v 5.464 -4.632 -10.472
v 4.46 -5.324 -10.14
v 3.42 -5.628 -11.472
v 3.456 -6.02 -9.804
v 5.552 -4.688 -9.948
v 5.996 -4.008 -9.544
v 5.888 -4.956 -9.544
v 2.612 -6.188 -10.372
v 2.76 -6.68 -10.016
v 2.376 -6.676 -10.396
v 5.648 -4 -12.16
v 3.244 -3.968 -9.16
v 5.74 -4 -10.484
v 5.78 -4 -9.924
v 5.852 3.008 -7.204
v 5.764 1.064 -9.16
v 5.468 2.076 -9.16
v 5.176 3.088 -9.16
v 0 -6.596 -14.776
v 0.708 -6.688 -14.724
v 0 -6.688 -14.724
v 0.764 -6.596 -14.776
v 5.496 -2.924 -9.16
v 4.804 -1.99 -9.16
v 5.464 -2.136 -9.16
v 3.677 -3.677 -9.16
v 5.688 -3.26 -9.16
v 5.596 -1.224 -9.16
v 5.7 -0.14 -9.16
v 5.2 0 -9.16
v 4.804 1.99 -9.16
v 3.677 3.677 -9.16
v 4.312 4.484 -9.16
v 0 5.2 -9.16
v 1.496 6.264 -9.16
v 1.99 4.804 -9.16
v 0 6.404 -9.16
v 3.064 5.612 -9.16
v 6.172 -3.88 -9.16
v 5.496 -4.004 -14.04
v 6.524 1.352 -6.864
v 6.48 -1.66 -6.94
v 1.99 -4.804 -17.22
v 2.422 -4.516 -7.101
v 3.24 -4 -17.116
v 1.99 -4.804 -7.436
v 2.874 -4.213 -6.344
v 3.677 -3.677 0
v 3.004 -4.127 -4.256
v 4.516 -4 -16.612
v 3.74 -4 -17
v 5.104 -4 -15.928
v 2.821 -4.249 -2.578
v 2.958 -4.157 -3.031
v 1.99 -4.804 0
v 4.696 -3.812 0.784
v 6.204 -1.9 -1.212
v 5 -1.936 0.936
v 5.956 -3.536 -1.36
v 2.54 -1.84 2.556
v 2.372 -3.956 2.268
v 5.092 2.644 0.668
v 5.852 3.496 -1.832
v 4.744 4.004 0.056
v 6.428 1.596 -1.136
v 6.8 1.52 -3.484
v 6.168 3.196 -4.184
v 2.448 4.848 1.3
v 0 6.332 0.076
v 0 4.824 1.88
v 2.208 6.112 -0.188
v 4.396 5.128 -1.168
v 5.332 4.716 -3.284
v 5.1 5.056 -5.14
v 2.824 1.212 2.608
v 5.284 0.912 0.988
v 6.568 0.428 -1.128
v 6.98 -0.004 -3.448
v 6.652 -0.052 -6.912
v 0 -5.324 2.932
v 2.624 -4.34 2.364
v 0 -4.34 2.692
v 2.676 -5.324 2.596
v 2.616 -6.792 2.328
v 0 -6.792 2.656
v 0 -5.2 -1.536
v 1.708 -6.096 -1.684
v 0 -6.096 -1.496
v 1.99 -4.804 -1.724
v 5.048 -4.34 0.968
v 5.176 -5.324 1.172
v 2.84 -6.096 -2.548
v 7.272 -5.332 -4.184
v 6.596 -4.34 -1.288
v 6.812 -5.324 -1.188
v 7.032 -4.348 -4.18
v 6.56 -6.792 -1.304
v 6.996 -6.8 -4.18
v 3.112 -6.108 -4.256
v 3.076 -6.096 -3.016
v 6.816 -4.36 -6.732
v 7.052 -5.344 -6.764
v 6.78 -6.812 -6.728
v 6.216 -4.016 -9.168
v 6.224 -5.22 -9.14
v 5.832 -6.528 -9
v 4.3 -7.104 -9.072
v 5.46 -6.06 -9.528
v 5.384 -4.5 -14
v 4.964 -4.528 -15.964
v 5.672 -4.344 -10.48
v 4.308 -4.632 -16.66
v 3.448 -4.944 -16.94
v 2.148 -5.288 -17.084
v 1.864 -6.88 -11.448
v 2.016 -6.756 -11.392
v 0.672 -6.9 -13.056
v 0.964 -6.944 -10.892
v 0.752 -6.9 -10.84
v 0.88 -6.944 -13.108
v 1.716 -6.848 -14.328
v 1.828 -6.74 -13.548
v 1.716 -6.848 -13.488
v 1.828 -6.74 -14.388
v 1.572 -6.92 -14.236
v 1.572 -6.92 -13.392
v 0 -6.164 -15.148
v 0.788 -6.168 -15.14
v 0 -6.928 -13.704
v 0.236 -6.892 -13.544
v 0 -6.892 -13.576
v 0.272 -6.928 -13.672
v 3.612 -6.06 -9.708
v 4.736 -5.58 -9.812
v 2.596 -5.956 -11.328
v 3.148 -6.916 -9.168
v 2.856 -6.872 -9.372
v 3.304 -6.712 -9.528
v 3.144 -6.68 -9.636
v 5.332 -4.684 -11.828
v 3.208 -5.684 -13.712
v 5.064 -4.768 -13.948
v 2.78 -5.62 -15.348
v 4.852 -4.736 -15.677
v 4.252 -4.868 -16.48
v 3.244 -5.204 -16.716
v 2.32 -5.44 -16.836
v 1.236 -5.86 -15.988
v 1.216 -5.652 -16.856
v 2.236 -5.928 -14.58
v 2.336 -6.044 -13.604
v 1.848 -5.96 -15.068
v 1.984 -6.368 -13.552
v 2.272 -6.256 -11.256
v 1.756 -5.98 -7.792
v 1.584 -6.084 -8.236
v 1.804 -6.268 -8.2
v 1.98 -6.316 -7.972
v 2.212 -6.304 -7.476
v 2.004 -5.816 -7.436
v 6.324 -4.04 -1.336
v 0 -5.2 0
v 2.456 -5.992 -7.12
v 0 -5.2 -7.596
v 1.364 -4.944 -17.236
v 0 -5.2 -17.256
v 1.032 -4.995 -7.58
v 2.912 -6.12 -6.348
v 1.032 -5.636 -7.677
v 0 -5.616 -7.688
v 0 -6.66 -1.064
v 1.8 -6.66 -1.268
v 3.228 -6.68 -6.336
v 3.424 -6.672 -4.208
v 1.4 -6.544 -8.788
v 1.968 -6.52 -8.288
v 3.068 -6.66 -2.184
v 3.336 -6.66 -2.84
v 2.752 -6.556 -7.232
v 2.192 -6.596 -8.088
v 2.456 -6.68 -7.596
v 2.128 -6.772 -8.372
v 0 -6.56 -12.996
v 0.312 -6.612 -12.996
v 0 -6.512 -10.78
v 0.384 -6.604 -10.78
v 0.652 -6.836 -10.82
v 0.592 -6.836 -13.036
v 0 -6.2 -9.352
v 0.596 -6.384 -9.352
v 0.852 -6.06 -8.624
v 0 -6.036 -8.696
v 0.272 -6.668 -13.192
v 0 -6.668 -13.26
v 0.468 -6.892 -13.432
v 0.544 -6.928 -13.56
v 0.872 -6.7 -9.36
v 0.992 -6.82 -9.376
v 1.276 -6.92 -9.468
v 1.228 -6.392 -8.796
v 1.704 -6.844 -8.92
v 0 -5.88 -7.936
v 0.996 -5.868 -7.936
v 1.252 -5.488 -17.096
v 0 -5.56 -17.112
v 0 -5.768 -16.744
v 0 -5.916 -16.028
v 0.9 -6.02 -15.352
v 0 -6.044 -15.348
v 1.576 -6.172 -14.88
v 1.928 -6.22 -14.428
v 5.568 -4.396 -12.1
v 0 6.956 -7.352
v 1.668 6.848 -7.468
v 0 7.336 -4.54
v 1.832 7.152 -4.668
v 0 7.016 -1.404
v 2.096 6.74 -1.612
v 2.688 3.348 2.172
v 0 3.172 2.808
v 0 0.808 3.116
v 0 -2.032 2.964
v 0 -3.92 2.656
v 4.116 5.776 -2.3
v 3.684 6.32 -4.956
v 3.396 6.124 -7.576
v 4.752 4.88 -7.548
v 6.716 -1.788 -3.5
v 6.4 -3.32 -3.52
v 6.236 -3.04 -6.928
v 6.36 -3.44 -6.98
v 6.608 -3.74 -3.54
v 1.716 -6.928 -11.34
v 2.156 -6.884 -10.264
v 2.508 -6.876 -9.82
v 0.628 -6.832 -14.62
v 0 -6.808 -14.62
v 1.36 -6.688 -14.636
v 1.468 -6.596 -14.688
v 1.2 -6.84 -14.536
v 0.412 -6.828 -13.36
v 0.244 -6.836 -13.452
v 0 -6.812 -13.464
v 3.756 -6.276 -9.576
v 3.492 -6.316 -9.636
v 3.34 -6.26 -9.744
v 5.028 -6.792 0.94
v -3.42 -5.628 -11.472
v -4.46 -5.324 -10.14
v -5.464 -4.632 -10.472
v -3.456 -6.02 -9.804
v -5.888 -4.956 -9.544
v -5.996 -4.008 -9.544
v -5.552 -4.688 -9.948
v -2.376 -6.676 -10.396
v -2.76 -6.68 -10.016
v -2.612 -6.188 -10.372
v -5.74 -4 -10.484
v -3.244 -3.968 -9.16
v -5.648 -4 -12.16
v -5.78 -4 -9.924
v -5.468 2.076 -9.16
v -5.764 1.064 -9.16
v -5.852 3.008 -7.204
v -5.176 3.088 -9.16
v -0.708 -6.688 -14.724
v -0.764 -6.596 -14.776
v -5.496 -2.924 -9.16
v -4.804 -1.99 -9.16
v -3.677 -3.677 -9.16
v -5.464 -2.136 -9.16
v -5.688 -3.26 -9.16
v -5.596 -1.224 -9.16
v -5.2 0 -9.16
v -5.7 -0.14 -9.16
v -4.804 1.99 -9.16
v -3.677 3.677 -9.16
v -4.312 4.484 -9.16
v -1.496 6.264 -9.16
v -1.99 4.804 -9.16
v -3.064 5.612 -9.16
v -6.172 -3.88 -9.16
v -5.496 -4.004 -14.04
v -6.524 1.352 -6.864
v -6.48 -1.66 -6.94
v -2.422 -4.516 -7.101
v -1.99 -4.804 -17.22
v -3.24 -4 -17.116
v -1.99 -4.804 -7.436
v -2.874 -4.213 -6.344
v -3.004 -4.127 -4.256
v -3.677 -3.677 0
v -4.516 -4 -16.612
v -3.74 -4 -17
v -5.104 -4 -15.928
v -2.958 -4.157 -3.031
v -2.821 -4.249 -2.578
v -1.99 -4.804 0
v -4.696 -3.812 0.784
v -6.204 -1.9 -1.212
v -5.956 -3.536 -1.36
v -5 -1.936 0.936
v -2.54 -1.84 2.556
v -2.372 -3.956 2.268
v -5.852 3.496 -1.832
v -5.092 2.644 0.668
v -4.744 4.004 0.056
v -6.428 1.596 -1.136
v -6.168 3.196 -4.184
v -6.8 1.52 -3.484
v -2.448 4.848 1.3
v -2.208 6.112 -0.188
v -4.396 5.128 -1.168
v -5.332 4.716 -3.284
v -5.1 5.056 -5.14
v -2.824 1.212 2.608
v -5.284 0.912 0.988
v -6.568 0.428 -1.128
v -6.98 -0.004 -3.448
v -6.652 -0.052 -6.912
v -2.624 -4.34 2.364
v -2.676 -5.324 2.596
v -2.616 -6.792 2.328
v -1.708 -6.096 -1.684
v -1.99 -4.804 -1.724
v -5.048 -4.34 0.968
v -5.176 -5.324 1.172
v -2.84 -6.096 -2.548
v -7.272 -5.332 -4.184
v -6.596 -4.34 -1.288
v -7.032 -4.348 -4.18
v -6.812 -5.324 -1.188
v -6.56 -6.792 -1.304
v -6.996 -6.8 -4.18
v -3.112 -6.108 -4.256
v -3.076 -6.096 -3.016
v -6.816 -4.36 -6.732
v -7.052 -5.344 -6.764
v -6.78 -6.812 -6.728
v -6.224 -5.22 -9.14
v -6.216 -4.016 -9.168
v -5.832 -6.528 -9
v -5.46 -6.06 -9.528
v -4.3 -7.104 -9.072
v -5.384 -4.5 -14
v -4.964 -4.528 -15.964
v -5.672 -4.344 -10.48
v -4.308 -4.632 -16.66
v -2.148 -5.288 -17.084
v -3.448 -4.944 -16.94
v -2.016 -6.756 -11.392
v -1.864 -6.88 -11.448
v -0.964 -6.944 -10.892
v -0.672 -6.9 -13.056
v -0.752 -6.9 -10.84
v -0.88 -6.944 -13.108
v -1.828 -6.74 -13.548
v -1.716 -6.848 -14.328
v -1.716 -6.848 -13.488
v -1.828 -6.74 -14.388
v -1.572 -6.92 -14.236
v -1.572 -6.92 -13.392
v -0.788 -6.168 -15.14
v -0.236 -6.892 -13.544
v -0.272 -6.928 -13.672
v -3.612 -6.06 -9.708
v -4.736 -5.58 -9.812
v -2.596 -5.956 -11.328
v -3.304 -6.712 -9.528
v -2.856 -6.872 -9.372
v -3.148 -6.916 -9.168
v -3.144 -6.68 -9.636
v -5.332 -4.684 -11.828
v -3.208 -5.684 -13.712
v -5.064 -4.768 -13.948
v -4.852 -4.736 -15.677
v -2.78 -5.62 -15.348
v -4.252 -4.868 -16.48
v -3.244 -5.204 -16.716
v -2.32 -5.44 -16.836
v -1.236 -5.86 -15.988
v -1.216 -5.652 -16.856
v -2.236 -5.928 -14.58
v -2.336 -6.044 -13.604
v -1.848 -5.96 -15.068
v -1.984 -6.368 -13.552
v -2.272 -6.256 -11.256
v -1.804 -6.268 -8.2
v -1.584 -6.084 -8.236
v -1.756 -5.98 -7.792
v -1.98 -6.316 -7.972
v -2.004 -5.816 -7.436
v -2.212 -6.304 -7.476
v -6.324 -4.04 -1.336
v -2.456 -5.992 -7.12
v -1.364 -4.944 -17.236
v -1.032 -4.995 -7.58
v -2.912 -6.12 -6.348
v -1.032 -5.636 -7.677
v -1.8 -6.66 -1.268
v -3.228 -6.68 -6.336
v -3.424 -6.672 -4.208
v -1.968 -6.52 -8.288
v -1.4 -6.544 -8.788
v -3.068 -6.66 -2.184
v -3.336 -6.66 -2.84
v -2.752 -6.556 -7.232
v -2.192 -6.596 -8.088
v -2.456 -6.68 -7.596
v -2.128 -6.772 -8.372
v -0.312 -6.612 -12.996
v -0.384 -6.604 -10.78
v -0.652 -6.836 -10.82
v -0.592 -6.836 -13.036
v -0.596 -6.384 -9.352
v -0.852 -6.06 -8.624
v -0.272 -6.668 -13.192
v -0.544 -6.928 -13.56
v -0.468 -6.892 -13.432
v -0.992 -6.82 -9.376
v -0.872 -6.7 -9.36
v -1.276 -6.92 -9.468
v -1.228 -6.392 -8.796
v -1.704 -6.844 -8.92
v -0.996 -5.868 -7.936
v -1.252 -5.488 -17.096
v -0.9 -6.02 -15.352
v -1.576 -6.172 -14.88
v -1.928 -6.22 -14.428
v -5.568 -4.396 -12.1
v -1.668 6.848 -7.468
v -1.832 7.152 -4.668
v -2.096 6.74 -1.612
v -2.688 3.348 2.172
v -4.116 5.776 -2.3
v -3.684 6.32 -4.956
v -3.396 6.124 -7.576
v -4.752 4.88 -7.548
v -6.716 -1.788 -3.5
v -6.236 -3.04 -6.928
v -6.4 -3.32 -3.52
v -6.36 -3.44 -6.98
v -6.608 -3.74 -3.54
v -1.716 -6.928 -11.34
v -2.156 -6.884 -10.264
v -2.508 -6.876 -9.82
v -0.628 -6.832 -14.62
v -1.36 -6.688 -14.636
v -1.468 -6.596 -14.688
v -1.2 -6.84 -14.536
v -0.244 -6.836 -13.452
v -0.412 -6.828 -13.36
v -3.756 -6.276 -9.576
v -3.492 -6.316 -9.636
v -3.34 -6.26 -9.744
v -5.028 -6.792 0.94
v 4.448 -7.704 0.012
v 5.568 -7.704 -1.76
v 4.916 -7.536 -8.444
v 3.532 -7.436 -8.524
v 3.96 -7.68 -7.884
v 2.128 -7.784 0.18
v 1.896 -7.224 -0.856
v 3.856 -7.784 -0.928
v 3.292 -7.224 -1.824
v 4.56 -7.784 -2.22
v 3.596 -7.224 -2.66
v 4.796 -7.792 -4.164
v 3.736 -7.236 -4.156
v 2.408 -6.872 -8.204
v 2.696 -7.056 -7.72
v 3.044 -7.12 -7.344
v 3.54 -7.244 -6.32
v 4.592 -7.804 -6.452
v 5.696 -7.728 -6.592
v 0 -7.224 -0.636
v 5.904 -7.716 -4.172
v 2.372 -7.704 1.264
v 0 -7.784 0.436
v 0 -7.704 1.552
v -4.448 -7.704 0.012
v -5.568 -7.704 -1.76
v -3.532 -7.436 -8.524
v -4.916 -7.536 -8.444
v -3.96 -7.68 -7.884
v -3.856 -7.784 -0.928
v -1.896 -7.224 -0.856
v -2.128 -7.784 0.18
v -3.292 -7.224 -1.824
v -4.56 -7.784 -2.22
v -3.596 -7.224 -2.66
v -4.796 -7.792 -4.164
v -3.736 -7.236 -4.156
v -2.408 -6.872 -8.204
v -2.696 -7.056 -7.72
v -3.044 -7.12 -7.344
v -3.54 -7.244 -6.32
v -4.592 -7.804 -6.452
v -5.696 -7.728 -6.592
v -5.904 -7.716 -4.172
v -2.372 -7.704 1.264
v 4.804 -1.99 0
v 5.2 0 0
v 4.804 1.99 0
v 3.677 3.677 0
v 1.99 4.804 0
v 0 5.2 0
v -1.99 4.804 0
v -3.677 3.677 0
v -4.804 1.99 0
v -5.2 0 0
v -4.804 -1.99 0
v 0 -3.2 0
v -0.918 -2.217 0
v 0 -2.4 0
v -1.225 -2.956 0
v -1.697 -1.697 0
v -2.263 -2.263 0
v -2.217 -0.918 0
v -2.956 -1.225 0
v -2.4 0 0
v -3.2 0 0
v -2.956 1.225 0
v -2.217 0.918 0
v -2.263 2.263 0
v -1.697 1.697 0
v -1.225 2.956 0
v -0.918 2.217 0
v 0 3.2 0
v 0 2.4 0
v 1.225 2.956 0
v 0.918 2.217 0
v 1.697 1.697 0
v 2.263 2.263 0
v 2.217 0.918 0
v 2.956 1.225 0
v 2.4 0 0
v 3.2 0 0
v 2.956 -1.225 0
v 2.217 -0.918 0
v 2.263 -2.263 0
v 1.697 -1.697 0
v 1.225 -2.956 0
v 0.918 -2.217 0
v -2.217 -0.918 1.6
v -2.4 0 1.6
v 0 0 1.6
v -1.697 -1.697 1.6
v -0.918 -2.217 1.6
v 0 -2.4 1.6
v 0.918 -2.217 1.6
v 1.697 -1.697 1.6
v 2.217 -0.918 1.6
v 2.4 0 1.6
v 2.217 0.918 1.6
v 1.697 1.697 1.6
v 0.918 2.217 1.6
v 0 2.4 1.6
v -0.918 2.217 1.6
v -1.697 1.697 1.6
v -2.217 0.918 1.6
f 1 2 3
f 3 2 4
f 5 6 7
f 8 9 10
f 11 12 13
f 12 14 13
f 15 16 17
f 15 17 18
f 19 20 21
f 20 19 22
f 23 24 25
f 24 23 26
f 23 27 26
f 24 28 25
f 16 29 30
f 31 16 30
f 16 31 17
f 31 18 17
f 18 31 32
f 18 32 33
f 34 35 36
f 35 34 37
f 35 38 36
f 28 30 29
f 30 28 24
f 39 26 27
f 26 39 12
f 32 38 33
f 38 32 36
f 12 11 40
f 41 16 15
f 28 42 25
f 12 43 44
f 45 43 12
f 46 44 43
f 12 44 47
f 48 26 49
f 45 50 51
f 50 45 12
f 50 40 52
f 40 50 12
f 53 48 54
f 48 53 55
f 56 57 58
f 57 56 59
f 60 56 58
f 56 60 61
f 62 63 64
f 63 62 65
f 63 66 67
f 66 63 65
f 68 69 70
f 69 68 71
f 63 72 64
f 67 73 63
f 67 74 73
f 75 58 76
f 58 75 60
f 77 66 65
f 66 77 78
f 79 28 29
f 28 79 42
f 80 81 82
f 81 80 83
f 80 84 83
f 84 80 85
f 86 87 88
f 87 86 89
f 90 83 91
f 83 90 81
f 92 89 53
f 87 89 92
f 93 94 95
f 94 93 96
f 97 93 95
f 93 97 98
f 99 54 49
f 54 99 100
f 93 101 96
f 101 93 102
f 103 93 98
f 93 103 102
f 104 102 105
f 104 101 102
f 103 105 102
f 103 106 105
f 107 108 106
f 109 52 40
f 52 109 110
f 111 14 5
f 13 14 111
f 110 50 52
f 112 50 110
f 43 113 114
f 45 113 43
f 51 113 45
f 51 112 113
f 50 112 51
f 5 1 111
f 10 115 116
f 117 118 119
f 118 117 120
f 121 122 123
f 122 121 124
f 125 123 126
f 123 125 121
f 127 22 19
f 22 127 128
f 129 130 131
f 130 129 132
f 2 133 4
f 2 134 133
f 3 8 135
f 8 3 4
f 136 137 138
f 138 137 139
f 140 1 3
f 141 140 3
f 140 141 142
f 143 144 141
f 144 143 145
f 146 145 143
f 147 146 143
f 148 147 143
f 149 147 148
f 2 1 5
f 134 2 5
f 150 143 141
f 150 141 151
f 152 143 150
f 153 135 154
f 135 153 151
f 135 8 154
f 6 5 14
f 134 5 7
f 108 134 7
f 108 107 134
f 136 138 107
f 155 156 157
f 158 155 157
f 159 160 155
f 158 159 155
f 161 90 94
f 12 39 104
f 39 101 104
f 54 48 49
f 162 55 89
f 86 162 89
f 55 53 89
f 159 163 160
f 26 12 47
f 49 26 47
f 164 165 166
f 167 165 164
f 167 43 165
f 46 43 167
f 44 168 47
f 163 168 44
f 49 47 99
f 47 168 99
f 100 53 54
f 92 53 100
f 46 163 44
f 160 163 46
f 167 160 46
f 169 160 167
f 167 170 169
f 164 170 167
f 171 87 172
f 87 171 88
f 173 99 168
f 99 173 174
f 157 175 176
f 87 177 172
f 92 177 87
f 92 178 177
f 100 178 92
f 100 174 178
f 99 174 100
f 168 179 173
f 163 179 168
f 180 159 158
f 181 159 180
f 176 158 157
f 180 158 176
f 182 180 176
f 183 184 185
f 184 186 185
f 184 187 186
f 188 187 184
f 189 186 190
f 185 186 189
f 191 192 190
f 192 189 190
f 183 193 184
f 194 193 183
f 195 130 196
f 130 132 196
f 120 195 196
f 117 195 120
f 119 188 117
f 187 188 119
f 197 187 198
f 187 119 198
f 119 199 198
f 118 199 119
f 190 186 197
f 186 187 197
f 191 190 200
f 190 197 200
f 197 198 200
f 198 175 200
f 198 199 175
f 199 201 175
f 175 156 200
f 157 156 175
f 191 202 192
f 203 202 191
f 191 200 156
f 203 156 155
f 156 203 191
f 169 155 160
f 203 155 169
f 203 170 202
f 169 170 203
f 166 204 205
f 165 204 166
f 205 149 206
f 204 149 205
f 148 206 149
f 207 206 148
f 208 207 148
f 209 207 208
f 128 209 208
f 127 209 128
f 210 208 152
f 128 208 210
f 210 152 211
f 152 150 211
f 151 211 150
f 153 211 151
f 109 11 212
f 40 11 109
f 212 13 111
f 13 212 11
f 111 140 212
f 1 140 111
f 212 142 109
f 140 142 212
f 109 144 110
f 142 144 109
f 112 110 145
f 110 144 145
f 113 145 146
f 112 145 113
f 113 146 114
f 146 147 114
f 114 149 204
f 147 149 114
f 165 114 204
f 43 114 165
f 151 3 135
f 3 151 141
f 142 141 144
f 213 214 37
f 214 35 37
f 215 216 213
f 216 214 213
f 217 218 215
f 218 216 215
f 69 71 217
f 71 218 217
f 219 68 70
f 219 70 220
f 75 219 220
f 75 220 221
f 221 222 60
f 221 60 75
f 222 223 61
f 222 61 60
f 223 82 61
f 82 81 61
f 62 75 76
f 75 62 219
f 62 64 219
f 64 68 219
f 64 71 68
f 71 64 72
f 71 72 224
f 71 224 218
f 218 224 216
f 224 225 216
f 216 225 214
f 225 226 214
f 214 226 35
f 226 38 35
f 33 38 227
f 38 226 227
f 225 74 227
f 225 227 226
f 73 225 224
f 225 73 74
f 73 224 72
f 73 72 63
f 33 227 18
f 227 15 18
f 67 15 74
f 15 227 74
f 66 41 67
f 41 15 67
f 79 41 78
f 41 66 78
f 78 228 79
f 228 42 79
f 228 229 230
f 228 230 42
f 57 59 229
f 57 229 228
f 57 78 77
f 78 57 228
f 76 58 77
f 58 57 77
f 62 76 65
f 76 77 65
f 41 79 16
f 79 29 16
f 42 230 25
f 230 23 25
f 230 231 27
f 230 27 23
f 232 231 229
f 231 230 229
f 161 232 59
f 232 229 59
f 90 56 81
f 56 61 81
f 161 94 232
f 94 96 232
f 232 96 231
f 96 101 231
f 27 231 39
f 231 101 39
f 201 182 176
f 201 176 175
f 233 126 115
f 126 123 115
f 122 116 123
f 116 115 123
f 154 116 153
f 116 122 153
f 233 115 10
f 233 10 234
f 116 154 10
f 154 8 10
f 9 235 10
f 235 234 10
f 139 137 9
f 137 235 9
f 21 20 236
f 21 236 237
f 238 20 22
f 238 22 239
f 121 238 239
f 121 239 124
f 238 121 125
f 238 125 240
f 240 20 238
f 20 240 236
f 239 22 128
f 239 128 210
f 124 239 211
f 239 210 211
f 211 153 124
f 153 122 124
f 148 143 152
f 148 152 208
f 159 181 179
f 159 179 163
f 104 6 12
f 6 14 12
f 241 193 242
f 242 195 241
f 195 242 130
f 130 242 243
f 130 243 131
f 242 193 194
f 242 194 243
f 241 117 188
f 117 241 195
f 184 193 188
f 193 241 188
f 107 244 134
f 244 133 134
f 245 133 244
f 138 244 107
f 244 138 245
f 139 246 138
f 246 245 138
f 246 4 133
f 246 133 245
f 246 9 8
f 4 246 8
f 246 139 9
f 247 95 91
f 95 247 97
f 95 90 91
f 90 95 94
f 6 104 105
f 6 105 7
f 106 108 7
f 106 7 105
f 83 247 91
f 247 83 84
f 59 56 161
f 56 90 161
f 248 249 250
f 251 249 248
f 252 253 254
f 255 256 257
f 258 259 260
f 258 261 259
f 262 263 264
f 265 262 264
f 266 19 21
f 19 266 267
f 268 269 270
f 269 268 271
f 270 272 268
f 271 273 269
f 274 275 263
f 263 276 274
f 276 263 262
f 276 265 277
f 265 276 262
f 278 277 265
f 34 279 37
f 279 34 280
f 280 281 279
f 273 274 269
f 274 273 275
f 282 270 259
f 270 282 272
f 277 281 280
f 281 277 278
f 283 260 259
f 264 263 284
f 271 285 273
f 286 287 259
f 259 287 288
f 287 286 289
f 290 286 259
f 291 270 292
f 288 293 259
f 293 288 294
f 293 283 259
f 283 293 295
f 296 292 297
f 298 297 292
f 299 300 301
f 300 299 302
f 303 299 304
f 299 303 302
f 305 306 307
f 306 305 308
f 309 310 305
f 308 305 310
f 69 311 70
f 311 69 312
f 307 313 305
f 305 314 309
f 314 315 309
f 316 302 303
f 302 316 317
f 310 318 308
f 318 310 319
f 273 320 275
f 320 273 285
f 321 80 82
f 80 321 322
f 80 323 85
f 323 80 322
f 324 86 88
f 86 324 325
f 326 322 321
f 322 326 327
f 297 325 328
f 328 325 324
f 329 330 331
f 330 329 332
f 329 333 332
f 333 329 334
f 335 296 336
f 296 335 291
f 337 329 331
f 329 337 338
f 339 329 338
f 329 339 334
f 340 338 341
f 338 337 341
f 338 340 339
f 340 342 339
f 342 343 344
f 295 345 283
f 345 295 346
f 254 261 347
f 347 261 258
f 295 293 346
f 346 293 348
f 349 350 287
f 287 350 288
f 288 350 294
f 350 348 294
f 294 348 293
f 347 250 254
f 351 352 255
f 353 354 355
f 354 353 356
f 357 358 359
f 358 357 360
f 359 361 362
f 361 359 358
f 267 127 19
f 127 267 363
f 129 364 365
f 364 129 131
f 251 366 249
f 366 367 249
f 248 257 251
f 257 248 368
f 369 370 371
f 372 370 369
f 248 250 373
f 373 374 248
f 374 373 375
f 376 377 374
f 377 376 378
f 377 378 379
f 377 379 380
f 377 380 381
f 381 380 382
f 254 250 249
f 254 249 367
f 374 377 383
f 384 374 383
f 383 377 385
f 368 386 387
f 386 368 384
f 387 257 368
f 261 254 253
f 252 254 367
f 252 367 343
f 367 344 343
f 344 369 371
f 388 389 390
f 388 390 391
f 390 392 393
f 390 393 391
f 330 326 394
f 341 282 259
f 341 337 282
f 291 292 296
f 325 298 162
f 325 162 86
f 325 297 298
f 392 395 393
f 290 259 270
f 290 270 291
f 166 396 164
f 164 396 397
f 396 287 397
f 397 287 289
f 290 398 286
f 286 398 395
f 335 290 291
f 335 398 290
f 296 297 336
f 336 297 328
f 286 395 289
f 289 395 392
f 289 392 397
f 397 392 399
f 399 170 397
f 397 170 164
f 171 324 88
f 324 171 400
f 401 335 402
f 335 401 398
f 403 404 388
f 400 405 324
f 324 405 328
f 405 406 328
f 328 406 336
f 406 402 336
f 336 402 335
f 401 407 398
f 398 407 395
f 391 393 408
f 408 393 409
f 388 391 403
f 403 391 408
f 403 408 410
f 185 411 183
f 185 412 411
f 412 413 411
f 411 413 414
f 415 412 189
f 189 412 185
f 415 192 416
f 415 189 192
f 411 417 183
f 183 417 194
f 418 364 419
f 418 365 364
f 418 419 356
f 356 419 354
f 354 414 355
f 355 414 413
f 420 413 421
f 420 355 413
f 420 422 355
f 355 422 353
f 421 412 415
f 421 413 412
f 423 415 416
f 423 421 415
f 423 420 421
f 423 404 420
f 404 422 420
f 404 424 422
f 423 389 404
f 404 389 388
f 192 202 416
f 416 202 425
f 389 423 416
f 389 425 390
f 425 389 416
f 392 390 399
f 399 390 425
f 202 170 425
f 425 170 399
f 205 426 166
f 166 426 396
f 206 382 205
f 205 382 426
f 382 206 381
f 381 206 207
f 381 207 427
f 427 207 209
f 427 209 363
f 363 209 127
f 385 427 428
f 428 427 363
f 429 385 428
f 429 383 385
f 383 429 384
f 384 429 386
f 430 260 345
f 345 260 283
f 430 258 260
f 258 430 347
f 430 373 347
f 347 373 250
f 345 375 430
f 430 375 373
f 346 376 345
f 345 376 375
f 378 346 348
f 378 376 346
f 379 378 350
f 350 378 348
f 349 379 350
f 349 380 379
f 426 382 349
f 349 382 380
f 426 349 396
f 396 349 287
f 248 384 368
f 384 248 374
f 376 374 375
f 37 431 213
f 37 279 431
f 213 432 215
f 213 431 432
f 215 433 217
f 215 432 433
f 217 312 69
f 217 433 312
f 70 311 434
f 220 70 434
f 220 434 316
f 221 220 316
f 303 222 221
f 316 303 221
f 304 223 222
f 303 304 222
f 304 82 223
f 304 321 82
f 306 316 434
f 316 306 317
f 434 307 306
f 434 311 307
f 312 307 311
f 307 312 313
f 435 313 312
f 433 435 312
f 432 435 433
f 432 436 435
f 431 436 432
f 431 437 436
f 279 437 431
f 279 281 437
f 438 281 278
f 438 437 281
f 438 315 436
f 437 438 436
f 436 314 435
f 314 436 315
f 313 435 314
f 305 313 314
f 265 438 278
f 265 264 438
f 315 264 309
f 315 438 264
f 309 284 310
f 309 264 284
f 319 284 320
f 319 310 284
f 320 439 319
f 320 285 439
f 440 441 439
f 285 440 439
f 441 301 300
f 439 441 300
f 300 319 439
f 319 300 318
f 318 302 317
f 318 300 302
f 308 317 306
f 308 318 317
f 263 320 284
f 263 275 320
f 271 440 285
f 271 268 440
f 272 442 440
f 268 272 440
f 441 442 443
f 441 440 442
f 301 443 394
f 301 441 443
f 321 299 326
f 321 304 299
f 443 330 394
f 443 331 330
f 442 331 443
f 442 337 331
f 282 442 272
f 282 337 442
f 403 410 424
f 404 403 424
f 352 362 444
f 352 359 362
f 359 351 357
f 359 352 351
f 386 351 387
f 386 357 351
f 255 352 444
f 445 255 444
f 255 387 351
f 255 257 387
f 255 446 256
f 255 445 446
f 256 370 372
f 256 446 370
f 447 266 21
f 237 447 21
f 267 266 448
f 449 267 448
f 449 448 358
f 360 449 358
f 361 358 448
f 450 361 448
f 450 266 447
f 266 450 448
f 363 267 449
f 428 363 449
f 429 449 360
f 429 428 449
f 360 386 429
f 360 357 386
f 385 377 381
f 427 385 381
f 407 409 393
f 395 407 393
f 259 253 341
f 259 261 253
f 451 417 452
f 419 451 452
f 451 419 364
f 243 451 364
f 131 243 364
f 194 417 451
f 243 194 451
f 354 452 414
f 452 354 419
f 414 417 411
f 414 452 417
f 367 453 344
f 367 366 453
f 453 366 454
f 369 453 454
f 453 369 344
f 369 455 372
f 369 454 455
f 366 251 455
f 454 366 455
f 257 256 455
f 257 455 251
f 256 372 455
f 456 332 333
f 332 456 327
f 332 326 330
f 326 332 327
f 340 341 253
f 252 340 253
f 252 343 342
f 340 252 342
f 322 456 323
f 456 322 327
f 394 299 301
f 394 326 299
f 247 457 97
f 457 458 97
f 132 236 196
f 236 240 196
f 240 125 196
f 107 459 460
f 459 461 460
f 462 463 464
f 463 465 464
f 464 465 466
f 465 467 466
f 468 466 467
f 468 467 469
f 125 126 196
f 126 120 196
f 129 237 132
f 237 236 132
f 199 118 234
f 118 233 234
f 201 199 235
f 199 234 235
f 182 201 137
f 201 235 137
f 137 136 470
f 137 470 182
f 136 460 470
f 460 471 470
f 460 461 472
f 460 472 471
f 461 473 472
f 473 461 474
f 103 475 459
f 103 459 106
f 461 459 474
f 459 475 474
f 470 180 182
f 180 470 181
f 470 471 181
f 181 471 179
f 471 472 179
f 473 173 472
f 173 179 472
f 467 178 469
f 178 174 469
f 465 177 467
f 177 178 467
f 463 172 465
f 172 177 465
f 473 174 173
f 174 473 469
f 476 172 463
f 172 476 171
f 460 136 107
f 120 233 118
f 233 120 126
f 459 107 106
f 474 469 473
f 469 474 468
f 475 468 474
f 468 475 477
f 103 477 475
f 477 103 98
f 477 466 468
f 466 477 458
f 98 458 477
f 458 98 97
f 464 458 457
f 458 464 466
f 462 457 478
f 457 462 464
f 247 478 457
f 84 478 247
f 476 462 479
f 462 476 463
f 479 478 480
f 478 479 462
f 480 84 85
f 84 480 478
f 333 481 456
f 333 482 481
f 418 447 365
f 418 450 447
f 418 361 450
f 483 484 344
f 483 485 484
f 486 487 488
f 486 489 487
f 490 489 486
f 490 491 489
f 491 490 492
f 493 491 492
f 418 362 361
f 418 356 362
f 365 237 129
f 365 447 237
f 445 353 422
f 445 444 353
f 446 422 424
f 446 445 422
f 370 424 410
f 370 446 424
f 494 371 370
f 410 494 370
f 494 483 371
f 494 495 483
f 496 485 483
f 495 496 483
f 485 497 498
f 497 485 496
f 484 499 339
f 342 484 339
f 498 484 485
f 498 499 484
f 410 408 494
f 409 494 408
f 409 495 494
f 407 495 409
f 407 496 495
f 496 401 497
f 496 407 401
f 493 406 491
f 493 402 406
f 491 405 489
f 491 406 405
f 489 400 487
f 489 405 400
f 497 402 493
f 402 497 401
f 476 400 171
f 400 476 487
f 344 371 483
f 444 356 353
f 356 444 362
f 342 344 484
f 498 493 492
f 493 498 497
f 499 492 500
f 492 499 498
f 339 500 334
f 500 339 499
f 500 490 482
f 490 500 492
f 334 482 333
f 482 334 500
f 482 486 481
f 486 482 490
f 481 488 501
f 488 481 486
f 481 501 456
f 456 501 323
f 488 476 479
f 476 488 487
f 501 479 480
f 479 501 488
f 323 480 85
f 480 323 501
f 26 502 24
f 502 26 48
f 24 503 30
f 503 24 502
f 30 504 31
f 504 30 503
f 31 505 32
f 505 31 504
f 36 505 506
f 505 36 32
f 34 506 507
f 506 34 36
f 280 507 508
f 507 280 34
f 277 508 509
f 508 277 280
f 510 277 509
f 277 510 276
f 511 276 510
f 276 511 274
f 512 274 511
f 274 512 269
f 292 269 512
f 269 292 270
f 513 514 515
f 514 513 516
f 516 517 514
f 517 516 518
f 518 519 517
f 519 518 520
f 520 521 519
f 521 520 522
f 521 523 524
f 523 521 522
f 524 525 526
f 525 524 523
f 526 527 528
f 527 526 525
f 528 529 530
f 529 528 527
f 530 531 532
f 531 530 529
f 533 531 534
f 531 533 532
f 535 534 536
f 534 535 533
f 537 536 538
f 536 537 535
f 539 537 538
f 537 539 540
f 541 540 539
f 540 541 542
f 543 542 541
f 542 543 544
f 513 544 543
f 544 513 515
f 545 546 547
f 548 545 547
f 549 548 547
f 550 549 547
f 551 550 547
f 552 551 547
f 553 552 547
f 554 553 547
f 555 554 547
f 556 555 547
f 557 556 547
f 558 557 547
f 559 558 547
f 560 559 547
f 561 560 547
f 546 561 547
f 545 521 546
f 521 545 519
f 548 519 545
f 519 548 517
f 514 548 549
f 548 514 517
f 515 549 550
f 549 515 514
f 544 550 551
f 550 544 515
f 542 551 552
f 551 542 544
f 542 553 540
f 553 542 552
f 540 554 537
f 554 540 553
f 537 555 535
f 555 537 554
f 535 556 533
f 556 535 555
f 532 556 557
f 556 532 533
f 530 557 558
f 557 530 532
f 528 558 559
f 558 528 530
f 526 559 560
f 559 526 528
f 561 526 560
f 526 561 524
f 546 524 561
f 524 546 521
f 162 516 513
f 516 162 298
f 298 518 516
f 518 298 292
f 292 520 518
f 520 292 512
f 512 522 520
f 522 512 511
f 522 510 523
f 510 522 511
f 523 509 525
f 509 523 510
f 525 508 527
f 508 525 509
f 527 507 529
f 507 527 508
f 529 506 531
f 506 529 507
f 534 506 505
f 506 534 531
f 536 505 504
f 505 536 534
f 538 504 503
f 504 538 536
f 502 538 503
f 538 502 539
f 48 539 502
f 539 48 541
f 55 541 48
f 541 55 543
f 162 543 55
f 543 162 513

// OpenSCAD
use <../lib.scad>
use <../p/3-4cylo.scad>
use <s/30287s01.scad>
use <s/30287s02.scad>
use <../p/stud4o.scad>
function ldraw_lib__30287() = [
// 0 Minifig Hood Fur-lined
// 0 Name: 30287.dat
// 0 Author: Andy Westrate [westrate]
// 0 !LDRAW_ORG Part UPDATE 2017-01
// 0 !LICENSE Licensed under CC BY 4.0 : see CAreadme.txt
// 
// 0 BFC CERTIFY CCW
  [0,"BFC","CERTIFY"],
  [0,"BFC","CCW"],
// 
// 0 !CATEGORY Minifig Headwear
// 0 !KEYWORDS Arctic, BrickLink x205, parka
// 
// 0 !HISTORY 2008-12-20 {LEGO Universe Team} Original part shape
// 0 !HISTORY 2009-05-08 [westrate] File preparation for LDraw Parts
// 0 !HISTORY 2016-06-02 [Holly-Wood] Fixed inner diameter
// 0 !HISTORY 2017-12-30 [PTadmin] Official Update 2017-01
// 
// 
// 1 16 0 0 0 1 0 0 0 1 0 0 0 1 s\30287s01.dat
  [1,16,0,0,0,1,0,0,0,1,0,0,0,1, ldraw_lib__s__30287s01()],
// 1 16 0 0 0 -1 0 0 0 1 0 0 0 1 s\30287s01.dat
  [1,16,0,0,0,-1,0,0,0,1,0,0,0,1, ldraw_lib__s__30287s01()],
// 1 16 0 0 0 1 0 0 0 1 0 0 0 1 s\30287s02.dat
  [1,16,0,0,0,1,0,0,0,1,0,0,0,1, ldraw_lib__s__30287s02()],
// 1 16 0 0 0 -1 0 0 0 1 0 0 0 1 s\30287s02.dat
  [1,16,0,0,0,-1,0,0,0,1,0,0,0,1, ldraw_lib__s__30287s02()],
// 0 BFC INVERTNEXT
  [0,"BFC","INVERTNEXT"],
// 1 16 0 0 0 9.19239 0 9.19239 0 22.9 0 -9.19239 0 9.19239 3-4cylo.dat
  [1,16,0,0,0,9.19239,0,9.19239,0,22.9,0,-9.19239,0,9.19239, ldraw_lib__3_4cylo()],
// 
// 1 16 0 -4 0 1 0 0 0 -1 0 0 0 -1 stud4o.dat
  [1,16,0,-4,0,1,0,0,0,-1,0,0,0,-1, ldraw_lib__stud4o()],
// 4 16 0 0 -8 0 0 -13 -4.975 0 -12.011 -3.062 0 -7.391
  [4,16,0,0,-8,0,0,-13,-4.975,0,-12.011,-3.062,0,-7.391],
// 4 16 -3.062 0 -7.391 -4.975 0 -12.011 -9.192 0 -9.192 -5.657 0 -5.657
  [4,16,-3.062,0,-7.391,-4.975,0,-12.011,-9.192,0,-9.192,-5.657,0,-5.657],
// 4 16 -5.657 0 -5.657 -9.192 0 -9.192 -12.011 0 -4.975 -7.391 0 -3.062
  [4,16,-5.657,0,-5.657,-9.192,0,-9.192,-12.011,0,-4.975,-7.391,0,-3.062],
// 4 16 -7.391 0 -3.062 -12.011 0 -4.975 -13 0 0 -8 0 0
  [4,16,-7.391,0,-3.062,-12.011,0,-4.975,-13,0,0,-8,0,0],
// 4 16 -8 0 0 -13 0 0 -12.011 0 4.975 -7.391 0 3.062
  [4,16,-8,0,0,-13,0,0,-12.011,0,4.975,-7.391,0,3.062],
// 4 16 -7.391 0 3.062 -12.011 0 4.975 -9.192 0 9.192 -5.657 0 5.657
  [4,16,-7.391,0,3.062,-12.011,0,4.975,-9.192,0,9.192,-5.657,0,5.657],
// 4 16 -5.657 0 5.657 -9.192 0 9.192 -4.975 0 12.011 -3.062 0 7.391
  [4,16,-5.657,0,5.657,-9.192,0,9.192,-4.975,0,12.011,-3.062,0,7.391],
// 4 16 -3.062 0 7.391 -4.975 0 12.011 0 0 13 0 0 8
  [4,16,-3.062,0,7.391,-4.975,0,12.011,0,0,13,0,0,8],
// 4 16 0 0 8 0 0 13 4.975 0 12.011 3.062 0 7.391
  [4,16,0,0,8,0,0,13,4.975,0,12.011,3.062,0,7.391],
// 4 16 5.657 0 5.657 3.062 0 7.391 4.975 0 12.011 9.192 0 9.192
  [4,16,5.657,0,5.657,3.062,0,7.391,4.975,0,12.011,9.192,0,9.192],
// 4 16 5.657 0 5.657 9.192 0 9.192 12.011 0 4.975 7.391 0 3.062
  [4,16,5.657,0,5.657,9.192,0,9.192,12.011,0,4.975,7.391,0,3.062],
// 4 16 7.391 0 3.062 12.011 0 4.975 13 0 0 8 0 0
  [4,16,7.391,0,3.062,12.011,0,4.975,13,0,0,8,0,0],
// 4 16 8 0 0 13 0 0 12.011 0 -4.975 7.391 0 -3.062
  [4,16,8,0,0,13,0,0,12.011,0,-4.975,7.391,0,-3.062],
// 4 16 7.391 0 -3.062 12.011 0 -4.975 9.192 0 -9.192 5.657 0 -5.657
  [4,16,7.391,0,-3.062,12.011,0,-4.975,9.192,0,-9.192,5.657,0,-5.657],
// 4 16 5.657 0 -5.657 9.192 0 -9.192 4.975 0 -12.011 3.062 0 -7.391
  [4,16,5.657,0,-5.657,9.192,0,-9.192,4.975,0,-12.011,3.062,0,-7.391],
// 4 16 3.062 0 -7.391 4.975 0 -12.011 0 0 -13 0 0 -8
  [4,16,3.062,0,-7.391,4.975,0,-12.011,0,0,-13,0,0,-8],
];
module ldraw_lib__30287(step=0, col=false, unit=2/5, alt=false, line=0.2, solid=!$preview)
    makepoly(ldraw_lib__30287(), step=step, col=col, unit=unit, alt=alt, line=line, solid=solid);
ldraw_lib__30287(line=0.2);
